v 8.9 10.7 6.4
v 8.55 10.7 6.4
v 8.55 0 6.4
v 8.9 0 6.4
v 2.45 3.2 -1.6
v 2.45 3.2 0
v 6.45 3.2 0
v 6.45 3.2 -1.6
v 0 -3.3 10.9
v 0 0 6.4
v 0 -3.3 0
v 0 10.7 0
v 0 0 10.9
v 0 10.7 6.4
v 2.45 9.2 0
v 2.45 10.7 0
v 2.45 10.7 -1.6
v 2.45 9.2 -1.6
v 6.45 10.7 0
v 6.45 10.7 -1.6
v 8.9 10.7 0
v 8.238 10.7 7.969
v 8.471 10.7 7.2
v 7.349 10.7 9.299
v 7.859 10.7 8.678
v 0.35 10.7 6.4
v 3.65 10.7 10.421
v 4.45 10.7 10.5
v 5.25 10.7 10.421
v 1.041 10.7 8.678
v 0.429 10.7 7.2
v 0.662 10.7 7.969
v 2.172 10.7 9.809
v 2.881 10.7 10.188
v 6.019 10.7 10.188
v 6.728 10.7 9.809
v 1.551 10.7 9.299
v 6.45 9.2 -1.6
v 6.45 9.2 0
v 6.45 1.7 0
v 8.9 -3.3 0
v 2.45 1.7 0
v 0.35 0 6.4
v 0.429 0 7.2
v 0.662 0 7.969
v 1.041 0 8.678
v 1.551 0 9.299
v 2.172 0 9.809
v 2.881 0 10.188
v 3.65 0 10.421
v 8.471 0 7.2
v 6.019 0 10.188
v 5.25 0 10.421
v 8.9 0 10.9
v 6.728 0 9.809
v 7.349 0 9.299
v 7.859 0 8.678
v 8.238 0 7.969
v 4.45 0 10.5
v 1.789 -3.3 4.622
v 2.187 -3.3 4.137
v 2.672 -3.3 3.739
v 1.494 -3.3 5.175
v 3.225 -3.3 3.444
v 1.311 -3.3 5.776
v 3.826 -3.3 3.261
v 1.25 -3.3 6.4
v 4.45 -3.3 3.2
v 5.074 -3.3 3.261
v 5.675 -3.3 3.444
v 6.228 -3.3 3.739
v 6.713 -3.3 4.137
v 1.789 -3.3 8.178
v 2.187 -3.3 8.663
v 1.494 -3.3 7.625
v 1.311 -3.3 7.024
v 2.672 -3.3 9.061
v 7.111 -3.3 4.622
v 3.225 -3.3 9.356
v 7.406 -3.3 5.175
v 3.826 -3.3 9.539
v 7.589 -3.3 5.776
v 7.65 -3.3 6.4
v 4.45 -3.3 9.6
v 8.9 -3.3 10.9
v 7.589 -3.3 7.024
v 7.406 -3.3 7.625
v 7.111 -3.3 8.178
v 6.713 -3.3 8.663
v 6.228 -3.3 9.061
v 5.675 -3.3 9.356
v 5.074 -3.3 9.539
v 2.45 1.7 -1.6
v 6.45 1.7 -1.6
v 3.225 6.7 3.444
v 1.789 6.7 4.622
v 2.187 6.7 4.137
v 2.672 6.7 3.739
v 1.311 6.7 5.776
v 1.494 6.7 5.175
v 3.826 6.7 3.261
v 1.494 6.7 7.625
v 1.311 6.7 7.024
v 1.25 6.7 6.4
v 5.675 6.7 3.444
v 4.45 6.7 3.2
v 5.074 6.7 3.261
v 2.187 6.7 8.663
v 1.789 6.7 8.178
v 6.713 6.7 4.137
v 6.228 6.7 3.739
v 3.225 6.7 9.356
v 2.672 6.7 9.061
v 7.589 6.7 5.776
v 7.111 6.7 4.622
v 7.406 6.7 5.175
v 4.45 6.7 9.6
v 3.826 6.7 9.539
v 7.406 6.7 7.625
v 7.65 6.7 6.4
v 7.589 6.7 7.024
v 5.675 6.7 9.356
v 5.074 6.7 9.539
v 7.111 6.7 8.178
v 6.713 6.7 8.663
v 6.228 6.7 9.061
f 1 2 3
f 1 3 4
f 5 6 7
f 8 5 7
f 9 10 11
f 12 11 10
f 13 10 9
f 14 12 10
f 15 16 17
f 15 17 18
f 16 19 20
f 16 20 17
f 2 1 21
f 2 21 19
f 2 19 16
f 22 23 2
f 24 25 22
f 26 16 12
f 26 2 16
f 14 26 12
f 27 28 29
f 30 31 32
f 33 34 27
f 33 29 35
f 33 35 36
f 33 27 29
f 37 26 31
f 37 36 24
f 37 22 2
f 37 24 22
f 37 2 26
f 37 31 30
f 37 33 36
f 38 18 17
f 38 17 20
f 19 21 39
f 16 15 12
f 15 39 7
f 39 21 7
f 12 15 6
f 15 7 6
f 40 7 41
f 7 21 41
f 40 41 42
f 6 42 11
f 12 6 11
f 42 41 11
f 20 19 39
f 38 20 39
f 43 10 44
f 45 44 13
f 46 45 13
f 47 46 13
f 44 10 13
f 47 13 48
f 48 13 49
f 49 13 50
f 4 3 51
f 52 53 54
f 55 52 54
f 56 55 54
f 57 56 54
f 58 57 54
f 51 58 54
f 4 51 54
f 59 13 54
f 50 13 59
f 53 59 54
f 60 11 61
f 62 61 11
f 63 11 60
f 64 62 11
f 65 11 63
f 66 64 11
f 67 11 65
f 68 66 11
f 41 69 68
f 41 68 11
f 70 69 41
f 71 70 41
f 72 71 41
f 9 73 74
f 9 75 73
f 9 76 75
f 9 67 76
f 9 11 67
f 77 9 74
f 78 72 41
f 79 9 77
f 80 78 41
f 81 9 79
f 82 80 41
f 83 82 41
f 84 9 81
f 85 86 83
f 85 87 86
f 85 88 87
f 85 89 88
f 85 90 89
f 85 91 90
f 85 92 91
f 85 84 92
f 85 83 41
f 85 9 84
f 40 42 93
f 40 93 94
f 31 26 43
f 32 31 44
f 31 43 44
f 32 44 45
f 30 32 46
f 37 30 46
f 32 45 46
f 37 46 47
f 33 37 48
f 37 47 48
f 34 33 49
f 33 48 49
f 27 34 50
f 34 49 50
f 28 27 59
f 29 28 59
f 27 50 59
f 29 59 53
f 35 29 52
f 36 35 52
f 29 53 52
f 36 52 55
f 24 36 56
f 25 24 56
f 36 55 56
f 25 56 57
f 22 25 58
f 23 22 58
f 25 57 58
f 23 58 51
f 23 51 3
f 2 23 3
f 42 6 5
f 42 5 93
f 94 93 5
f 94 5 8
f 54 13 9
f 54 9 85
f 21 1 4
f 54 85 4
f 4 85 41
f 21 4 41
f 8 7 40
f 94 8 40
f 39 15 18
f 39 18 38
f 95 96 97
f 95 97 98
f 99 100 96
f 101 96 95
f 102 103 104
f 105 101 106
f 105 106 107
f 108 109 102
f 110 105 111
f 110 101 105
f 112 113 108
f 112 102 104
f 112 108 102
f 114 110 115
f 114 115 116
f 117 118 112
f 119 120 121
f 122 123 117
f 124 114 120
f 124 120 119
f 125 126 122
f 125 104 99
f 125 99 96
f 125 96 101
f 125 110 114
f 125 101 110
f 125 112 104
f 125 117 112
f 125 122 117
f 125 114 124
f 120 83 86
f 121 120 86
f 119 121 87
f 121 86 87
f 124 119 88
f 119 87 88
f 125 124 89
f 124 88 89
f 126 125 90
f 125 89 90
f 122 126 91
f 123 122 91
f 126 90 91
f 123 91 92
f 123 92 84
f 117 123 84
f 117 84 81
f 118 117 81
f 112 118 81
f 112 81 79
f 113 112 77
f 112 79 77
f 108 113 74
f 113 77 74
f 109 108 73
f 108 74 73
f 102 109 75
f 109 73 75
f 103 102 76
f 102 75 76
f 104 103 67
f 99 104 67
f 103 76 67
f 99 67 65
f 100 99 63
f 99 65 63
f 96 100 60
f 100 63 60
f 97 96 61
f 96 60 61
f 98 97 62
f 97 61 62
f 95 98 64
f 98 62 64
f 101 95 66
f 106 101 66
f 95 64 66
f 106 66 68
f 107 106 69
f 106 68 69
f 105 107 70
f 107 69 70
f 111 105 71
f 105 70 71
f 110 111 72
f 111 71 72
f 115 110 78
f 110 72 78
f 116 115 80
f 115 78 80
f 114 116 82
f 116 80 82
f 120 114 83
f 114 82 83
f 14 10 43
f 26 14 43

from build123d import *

# Parameters (mm, degrees)
F0_W     = 8.9
F0_H     = 10.9
F1_DEPTH = 3.3
F3_DEPTH = 10.7
F4_R     = 3.2
F5_DEPTH = 10
F6_W     = 4
F6_H     = 1.5
F7_DEPTH = 1.6


with BuildPart() as f1:
    # F0 (on Front) → F1 (new body)
    with BuildSketch(Plane.XZ):
        with Locations((4.45, 5.45)):
            Rectangle(F0_W, F0_H)
    extrude(amount=F1_DEPTH)

    # F2 (on face) → F3 (join)
    with BuildSketch(Plane(origin=(0, 0, 0), x_dir=(-1, 0, 0), z_dir=(0, 1, 0))):
        with BuildLine():
            Line((-8.55, 6.4), (-8.9, 6.4))
            Line((-8.9, 6.4), (-8.9, 0))
            Line((-8.9, 0), (0, 0))
            Line((0, 0), (0, 6.4))
            Line((0, 6.4), (-0.35, 6.4))
            ThreePointArc((-0.35, 6.4), (-4.45, 10.5), (-8.55, 6.4))
        make_face()
    extrude(amount=F3_DEPTH)

    # F4 (on face) → F5 (cut)
    with BuildSketch(Plane.XZ.offset(3.3)):
        with Locations((4.45, 6.4)):
            Circle(F4_R)
    extrude(amount=-F5_DEPTH, mode=Mode.SUBTRACT)

    # F6 (on face) → F7 (join)
    with BuildSketch(Plane(origin=(0, 0, 0), x_dir=(1, 0, 0), z_dir=(0, 0, -1))):
        with Locations((4.45, -2.45)):
            Rectangle(F6_W, F6_H)
        with Locations((4.45, -9.95)):
            Rectangle(F6_W, F6_H)
    extrude(amount=F7_DEPTH)


solid = f1.part
